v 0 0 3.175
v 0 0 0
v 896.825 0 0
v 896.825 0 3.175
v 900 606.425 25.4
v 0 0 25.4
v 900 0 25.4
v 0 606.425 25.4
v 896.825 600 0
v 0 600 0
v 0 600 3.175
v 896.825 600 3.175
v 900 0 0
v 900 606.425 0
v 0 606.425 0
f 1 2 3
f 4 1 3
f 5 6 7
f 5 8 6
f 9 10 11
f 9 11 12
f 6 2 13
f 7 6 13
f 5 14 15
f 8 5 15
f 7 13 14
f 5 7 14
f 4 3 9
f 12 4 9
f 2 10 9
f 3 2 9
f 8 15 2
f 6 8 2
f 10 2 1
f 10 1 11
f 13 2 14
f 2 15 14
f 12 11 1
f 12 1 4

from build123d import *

# Parameters (mm, degrees)
F0_W     = 896.825
F0_H     = 600
F1_DEPTH = 3.175
F2_DEPTH = 25.4


with BuildPart() as f1:
    # F0 (on Top) → F1 (new body)
    with BuildSketch(Plane.XY):
        with Locations((448.4125, 300)):
            Rectangle(F0_W, F0_H)
    extrude(amount=F1_DEPTH)


with BuildPart() as f2:
    # F0 (on Top) → F2 (new body)
    with BuildSketch(Plane.XY):
        with Locations((448.4125, 300)):
            Rectangle(F0_W, F0_H)
        Polygon((896.825, 600), (896.825, 0), (900, 0), (900, 606.425), (0, 606.425), (0, 600), align=None)
    extrude(amount=F2_DEPTH)


solid = Compound([f1.part, f2.part])
